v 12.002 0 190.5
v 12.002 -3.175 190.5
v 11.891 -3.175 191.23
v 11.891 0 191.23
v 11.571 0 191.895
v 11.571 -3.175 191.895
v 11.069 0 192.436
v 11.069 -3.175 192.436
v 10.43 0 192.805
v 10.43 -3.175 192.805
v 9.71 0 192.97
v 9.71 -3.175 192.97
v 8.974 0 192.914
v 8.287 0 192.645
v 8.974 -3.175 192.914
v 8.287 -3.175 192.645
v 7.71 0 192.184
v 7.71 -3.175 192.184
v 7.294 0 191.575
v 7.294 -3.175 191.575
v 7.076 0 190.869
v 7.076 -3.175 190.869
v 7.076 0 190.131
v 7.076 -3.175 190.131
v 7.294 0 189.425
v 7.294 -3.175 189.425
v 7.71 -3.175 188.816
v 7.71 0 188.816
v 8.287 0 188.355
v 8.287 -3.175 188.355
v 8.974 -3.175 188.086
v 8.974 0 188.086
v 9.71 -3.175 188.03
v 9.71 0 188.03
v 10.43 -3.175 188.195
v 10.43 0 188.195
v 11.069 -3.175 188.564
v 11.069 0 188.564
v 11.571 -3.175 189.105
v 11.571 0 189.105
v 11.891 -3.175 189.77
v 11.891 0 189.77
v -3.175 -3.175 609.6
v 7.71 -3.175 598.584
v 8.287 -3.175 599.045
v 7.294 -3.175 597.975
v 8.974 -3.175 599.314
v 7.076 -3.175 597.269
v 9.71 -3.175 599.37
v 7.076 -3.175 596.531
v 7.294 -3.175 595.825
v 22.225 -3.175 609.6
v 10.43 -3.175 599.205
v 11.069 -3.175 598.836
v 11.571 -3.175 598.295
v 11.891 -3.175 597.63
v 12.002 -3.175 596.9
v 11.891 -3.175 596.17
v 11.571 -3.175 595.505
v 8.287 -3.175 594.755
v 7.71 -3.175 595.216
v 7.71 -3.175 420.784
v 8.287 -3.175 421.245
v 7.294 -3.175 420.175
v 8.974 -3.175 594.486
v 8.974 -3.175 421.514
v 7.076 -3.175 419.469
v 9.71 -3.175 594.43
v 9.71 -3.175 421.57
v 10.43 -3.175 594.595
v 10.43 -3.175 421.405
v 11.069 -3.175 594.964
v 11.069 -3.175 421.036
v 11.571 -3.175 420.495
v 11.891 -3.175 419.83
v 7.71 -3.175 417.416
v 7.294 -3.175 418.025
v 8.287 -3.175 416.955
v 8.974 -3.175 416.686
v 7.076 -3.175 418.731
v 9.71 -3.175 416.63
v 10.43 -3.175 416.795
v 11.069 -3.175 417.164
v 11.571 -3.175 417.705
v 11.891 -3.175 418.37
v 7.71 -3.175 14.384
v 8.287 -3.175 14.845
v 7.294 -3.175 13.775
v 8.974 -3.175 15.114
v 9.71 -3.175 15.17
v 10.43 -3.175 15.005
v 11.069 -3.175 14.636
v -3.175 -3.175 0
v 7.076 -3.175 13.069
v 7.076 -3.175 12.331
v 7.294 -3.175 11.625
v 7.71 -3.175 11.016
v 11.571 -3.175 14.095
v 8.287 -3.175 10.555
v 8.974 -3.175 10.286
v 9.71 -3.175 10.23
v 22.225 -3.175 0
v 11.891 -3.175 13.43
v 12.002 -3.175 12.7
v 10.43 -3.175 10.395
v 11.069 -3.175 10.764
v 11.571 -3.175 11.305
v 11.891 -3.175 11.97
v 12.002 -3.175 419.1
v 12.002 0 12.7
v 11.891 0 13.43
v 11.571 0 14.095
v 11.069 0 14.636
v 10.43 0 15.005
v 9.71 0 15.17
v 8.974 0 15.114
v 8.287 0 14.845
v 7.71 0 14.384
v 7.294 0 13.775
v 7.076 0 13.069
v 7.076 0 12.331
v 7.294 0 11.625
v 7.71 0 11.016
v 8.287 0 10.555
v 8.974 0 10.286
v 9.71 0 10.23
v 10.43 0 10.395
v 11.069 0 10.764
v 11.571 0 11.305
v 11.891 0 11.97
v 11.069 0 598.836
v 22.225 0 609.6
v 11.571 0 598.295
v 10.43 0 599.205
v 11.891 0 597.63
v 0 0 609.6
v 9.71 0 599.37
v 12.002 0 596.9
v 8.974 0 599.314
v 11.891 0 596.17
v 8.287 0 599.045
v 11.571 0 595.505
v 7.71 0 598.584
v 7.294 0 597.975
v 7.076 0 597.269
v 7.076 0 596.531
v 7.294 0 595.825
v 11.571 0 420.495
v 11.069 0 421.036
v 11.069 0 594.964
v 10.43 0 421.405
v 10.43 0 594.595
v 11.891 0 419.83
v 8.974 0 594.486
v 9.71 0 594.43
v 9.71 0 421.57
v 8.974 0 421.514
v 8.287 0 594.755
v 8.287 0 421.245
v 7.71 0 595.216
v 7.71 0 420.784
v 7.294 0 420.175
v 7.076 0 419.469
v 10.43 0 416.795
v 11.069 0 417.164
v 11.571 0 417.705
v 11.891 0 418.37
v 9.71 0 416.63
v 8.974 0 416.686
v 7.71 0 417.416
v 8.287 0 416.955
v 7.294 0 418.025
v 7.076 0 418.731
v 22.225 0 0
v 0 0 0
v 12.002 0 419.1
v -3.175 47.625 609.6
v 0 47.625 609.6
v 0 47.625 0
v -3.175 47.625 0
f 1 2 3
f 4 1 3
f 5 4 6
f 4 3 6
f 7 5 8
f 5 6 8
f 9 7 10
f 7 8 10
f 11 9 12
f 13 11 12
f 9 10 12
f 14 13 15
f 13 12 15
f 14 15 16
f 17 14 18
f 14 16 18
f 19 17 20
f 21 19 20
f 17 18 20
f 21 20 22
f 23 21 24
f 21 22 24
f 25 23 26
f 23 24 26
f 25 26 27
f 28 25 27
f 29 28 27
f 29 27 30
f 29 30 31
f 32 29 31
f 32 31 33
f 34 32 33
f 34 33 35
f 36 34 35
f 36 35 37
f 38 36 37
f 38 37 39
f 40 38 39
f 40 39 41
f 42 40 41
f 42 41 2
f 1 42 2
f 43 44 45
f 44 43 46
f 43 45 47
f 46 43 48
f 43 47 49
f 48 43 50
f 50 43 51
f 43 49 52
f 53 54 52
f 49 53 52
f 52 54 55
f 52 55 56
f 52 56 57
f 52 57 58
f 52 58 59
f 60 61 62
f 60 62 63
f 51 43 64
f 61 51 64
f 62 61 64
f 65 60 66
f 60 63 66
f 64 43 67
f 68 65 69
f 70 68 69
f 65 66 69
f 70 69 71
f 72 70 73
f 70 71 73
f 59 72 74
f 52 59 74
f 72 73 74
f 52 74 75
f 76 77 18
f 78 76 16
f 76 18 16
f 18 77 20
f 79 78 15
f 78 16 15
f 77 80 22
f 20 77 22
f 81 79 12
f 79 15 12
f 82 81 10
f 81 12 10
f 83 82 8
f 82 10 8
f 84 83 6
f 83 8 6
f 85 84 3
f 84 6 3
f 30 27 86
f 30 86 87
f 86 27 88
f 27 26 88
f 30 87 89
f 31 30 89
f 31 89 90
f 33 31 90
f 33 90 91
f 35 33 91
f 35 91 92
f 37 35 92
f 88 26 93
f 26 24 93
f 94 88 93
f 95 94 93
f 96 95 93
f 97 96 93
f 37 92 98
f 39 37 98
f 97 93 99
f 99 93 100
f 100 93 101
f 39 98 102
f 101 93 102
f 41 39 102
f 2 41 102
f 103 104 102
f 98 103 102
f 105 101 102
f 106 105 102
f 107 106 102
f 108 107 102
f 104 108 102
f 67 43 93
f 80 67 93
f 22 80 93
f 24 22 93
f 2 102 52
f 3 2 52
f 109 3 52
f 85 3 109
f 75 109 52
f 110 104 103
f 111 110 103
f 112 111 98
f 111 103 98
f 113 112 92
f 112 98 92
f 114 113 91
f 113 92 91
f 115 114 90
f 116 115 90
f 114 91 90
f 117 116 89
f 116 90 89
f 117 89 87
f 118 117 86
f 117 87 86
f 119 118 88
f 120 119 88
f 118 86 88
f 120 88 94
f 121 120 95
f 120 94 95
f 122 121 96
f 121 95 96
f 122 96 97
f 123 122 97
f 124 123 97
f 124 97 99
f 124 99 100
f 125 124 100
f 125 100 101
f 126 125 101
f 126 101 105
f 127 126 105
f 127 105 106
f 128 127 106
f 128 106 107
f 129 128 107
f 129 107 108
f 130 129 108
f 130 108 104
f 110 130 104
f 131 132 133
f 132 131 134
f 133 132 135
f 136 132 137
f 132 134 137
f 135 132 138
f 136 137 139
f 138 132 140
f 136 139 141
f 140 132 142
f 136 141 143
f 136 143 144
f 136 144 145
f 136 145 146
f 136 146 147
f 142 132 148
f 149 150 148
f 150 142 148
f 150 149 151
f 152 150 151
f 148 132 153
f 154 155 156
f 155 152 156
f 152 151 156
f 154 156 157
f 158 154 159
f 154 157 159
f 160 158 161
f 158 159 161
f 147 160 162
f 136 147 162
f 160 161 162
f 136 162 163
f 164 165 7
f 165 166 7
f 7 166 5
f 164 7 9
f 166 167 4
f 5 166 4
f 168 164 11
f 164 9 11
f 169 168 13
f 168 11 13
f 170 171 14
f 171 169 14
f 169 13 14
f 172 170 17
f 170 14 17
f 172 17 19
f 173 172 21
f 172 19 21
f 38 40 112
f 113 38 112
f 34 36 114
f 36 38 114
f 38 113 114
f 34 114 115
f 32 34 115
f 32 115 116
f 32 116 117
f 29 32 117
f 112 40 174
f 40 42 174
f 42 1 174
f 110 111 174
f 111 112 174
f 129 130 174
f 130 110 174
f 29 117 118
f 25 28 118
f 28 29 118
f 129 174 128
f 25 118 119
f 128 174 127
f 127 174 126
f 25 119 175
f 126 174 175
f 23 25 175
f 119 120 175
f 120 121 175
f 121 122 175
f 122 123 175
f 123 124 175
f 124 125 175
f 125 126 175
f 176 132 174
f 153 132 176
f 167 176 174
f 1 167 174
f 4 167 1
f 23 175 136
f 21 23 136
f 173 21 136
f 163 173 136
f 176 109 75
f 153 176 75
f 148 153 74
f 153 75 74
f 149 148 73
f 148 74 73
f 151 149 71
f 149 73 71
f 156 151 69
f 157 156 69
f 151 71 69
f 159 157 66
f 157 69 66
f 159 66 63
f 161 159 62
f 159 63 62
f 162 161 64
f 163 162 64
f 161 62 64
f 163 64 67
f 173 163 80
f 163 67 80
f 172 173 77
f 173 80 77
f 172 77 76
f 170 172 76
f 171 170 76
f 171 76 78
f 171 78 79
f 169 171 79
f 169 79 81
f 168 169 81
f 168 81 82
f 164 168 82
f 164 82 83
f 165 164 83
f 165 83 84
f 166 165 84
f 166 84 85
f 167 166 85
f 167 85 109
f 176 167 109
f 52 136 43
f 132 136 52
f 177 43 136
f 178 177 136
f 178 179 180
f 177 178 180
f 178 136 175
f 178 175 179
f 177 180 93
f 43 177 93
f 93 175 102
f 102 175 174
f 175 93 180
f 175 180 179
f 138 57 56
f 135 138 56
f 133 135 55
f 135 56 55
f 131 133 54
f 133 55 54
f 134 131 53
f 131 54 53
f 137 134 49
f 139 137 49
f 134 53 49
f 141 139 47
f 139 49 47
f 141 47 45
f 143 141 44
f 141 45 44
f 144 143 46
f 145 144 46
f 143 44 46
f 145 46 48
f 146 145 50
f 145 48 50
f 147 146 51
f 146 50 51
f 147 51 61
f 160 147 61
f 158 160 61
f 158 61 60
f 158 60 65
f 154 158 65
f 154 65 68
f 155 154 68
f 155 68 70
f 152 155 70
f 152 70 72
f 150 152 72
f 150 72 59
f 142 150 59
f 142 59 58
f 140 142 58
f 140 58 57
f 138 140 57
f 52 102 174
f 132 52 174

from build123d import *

# Parameters (mm, degrees)
F1_DEPTH = 609.6
F2_R     = 2.4765
F3_DEPTH = 50.801


with BuildPart() as f1:
    # F0 (on Top) → F1 (new body)
    with BuildSketch(Plane.XY):
        Polygon((0, 0), (0, 47.625), (-3.175, 47.625), (-3.175, -3.175), (22.225, -3.175), (22.225, 0), align=None)
    extrude(amount=F1_DEPTH)

    # F2 (on face) → F3 (cut, through all)
    with BuildSketch(Plane.XZ.offset(3.175)):
        with Locations((9.525, 12.7)):
            Circle(F2_R)
        with Locations((9.525, 190.5)):
            Circle(F2_R)
        with Locations((9.525, 419.1)):
            Circle(F2_R)
        with Locations((9.525, 596.9)):
            Circle(F2_R)
    extrude(amount=-F3_DEPTH, mode=Mode.SUBTRACT)


solid = f1.part
